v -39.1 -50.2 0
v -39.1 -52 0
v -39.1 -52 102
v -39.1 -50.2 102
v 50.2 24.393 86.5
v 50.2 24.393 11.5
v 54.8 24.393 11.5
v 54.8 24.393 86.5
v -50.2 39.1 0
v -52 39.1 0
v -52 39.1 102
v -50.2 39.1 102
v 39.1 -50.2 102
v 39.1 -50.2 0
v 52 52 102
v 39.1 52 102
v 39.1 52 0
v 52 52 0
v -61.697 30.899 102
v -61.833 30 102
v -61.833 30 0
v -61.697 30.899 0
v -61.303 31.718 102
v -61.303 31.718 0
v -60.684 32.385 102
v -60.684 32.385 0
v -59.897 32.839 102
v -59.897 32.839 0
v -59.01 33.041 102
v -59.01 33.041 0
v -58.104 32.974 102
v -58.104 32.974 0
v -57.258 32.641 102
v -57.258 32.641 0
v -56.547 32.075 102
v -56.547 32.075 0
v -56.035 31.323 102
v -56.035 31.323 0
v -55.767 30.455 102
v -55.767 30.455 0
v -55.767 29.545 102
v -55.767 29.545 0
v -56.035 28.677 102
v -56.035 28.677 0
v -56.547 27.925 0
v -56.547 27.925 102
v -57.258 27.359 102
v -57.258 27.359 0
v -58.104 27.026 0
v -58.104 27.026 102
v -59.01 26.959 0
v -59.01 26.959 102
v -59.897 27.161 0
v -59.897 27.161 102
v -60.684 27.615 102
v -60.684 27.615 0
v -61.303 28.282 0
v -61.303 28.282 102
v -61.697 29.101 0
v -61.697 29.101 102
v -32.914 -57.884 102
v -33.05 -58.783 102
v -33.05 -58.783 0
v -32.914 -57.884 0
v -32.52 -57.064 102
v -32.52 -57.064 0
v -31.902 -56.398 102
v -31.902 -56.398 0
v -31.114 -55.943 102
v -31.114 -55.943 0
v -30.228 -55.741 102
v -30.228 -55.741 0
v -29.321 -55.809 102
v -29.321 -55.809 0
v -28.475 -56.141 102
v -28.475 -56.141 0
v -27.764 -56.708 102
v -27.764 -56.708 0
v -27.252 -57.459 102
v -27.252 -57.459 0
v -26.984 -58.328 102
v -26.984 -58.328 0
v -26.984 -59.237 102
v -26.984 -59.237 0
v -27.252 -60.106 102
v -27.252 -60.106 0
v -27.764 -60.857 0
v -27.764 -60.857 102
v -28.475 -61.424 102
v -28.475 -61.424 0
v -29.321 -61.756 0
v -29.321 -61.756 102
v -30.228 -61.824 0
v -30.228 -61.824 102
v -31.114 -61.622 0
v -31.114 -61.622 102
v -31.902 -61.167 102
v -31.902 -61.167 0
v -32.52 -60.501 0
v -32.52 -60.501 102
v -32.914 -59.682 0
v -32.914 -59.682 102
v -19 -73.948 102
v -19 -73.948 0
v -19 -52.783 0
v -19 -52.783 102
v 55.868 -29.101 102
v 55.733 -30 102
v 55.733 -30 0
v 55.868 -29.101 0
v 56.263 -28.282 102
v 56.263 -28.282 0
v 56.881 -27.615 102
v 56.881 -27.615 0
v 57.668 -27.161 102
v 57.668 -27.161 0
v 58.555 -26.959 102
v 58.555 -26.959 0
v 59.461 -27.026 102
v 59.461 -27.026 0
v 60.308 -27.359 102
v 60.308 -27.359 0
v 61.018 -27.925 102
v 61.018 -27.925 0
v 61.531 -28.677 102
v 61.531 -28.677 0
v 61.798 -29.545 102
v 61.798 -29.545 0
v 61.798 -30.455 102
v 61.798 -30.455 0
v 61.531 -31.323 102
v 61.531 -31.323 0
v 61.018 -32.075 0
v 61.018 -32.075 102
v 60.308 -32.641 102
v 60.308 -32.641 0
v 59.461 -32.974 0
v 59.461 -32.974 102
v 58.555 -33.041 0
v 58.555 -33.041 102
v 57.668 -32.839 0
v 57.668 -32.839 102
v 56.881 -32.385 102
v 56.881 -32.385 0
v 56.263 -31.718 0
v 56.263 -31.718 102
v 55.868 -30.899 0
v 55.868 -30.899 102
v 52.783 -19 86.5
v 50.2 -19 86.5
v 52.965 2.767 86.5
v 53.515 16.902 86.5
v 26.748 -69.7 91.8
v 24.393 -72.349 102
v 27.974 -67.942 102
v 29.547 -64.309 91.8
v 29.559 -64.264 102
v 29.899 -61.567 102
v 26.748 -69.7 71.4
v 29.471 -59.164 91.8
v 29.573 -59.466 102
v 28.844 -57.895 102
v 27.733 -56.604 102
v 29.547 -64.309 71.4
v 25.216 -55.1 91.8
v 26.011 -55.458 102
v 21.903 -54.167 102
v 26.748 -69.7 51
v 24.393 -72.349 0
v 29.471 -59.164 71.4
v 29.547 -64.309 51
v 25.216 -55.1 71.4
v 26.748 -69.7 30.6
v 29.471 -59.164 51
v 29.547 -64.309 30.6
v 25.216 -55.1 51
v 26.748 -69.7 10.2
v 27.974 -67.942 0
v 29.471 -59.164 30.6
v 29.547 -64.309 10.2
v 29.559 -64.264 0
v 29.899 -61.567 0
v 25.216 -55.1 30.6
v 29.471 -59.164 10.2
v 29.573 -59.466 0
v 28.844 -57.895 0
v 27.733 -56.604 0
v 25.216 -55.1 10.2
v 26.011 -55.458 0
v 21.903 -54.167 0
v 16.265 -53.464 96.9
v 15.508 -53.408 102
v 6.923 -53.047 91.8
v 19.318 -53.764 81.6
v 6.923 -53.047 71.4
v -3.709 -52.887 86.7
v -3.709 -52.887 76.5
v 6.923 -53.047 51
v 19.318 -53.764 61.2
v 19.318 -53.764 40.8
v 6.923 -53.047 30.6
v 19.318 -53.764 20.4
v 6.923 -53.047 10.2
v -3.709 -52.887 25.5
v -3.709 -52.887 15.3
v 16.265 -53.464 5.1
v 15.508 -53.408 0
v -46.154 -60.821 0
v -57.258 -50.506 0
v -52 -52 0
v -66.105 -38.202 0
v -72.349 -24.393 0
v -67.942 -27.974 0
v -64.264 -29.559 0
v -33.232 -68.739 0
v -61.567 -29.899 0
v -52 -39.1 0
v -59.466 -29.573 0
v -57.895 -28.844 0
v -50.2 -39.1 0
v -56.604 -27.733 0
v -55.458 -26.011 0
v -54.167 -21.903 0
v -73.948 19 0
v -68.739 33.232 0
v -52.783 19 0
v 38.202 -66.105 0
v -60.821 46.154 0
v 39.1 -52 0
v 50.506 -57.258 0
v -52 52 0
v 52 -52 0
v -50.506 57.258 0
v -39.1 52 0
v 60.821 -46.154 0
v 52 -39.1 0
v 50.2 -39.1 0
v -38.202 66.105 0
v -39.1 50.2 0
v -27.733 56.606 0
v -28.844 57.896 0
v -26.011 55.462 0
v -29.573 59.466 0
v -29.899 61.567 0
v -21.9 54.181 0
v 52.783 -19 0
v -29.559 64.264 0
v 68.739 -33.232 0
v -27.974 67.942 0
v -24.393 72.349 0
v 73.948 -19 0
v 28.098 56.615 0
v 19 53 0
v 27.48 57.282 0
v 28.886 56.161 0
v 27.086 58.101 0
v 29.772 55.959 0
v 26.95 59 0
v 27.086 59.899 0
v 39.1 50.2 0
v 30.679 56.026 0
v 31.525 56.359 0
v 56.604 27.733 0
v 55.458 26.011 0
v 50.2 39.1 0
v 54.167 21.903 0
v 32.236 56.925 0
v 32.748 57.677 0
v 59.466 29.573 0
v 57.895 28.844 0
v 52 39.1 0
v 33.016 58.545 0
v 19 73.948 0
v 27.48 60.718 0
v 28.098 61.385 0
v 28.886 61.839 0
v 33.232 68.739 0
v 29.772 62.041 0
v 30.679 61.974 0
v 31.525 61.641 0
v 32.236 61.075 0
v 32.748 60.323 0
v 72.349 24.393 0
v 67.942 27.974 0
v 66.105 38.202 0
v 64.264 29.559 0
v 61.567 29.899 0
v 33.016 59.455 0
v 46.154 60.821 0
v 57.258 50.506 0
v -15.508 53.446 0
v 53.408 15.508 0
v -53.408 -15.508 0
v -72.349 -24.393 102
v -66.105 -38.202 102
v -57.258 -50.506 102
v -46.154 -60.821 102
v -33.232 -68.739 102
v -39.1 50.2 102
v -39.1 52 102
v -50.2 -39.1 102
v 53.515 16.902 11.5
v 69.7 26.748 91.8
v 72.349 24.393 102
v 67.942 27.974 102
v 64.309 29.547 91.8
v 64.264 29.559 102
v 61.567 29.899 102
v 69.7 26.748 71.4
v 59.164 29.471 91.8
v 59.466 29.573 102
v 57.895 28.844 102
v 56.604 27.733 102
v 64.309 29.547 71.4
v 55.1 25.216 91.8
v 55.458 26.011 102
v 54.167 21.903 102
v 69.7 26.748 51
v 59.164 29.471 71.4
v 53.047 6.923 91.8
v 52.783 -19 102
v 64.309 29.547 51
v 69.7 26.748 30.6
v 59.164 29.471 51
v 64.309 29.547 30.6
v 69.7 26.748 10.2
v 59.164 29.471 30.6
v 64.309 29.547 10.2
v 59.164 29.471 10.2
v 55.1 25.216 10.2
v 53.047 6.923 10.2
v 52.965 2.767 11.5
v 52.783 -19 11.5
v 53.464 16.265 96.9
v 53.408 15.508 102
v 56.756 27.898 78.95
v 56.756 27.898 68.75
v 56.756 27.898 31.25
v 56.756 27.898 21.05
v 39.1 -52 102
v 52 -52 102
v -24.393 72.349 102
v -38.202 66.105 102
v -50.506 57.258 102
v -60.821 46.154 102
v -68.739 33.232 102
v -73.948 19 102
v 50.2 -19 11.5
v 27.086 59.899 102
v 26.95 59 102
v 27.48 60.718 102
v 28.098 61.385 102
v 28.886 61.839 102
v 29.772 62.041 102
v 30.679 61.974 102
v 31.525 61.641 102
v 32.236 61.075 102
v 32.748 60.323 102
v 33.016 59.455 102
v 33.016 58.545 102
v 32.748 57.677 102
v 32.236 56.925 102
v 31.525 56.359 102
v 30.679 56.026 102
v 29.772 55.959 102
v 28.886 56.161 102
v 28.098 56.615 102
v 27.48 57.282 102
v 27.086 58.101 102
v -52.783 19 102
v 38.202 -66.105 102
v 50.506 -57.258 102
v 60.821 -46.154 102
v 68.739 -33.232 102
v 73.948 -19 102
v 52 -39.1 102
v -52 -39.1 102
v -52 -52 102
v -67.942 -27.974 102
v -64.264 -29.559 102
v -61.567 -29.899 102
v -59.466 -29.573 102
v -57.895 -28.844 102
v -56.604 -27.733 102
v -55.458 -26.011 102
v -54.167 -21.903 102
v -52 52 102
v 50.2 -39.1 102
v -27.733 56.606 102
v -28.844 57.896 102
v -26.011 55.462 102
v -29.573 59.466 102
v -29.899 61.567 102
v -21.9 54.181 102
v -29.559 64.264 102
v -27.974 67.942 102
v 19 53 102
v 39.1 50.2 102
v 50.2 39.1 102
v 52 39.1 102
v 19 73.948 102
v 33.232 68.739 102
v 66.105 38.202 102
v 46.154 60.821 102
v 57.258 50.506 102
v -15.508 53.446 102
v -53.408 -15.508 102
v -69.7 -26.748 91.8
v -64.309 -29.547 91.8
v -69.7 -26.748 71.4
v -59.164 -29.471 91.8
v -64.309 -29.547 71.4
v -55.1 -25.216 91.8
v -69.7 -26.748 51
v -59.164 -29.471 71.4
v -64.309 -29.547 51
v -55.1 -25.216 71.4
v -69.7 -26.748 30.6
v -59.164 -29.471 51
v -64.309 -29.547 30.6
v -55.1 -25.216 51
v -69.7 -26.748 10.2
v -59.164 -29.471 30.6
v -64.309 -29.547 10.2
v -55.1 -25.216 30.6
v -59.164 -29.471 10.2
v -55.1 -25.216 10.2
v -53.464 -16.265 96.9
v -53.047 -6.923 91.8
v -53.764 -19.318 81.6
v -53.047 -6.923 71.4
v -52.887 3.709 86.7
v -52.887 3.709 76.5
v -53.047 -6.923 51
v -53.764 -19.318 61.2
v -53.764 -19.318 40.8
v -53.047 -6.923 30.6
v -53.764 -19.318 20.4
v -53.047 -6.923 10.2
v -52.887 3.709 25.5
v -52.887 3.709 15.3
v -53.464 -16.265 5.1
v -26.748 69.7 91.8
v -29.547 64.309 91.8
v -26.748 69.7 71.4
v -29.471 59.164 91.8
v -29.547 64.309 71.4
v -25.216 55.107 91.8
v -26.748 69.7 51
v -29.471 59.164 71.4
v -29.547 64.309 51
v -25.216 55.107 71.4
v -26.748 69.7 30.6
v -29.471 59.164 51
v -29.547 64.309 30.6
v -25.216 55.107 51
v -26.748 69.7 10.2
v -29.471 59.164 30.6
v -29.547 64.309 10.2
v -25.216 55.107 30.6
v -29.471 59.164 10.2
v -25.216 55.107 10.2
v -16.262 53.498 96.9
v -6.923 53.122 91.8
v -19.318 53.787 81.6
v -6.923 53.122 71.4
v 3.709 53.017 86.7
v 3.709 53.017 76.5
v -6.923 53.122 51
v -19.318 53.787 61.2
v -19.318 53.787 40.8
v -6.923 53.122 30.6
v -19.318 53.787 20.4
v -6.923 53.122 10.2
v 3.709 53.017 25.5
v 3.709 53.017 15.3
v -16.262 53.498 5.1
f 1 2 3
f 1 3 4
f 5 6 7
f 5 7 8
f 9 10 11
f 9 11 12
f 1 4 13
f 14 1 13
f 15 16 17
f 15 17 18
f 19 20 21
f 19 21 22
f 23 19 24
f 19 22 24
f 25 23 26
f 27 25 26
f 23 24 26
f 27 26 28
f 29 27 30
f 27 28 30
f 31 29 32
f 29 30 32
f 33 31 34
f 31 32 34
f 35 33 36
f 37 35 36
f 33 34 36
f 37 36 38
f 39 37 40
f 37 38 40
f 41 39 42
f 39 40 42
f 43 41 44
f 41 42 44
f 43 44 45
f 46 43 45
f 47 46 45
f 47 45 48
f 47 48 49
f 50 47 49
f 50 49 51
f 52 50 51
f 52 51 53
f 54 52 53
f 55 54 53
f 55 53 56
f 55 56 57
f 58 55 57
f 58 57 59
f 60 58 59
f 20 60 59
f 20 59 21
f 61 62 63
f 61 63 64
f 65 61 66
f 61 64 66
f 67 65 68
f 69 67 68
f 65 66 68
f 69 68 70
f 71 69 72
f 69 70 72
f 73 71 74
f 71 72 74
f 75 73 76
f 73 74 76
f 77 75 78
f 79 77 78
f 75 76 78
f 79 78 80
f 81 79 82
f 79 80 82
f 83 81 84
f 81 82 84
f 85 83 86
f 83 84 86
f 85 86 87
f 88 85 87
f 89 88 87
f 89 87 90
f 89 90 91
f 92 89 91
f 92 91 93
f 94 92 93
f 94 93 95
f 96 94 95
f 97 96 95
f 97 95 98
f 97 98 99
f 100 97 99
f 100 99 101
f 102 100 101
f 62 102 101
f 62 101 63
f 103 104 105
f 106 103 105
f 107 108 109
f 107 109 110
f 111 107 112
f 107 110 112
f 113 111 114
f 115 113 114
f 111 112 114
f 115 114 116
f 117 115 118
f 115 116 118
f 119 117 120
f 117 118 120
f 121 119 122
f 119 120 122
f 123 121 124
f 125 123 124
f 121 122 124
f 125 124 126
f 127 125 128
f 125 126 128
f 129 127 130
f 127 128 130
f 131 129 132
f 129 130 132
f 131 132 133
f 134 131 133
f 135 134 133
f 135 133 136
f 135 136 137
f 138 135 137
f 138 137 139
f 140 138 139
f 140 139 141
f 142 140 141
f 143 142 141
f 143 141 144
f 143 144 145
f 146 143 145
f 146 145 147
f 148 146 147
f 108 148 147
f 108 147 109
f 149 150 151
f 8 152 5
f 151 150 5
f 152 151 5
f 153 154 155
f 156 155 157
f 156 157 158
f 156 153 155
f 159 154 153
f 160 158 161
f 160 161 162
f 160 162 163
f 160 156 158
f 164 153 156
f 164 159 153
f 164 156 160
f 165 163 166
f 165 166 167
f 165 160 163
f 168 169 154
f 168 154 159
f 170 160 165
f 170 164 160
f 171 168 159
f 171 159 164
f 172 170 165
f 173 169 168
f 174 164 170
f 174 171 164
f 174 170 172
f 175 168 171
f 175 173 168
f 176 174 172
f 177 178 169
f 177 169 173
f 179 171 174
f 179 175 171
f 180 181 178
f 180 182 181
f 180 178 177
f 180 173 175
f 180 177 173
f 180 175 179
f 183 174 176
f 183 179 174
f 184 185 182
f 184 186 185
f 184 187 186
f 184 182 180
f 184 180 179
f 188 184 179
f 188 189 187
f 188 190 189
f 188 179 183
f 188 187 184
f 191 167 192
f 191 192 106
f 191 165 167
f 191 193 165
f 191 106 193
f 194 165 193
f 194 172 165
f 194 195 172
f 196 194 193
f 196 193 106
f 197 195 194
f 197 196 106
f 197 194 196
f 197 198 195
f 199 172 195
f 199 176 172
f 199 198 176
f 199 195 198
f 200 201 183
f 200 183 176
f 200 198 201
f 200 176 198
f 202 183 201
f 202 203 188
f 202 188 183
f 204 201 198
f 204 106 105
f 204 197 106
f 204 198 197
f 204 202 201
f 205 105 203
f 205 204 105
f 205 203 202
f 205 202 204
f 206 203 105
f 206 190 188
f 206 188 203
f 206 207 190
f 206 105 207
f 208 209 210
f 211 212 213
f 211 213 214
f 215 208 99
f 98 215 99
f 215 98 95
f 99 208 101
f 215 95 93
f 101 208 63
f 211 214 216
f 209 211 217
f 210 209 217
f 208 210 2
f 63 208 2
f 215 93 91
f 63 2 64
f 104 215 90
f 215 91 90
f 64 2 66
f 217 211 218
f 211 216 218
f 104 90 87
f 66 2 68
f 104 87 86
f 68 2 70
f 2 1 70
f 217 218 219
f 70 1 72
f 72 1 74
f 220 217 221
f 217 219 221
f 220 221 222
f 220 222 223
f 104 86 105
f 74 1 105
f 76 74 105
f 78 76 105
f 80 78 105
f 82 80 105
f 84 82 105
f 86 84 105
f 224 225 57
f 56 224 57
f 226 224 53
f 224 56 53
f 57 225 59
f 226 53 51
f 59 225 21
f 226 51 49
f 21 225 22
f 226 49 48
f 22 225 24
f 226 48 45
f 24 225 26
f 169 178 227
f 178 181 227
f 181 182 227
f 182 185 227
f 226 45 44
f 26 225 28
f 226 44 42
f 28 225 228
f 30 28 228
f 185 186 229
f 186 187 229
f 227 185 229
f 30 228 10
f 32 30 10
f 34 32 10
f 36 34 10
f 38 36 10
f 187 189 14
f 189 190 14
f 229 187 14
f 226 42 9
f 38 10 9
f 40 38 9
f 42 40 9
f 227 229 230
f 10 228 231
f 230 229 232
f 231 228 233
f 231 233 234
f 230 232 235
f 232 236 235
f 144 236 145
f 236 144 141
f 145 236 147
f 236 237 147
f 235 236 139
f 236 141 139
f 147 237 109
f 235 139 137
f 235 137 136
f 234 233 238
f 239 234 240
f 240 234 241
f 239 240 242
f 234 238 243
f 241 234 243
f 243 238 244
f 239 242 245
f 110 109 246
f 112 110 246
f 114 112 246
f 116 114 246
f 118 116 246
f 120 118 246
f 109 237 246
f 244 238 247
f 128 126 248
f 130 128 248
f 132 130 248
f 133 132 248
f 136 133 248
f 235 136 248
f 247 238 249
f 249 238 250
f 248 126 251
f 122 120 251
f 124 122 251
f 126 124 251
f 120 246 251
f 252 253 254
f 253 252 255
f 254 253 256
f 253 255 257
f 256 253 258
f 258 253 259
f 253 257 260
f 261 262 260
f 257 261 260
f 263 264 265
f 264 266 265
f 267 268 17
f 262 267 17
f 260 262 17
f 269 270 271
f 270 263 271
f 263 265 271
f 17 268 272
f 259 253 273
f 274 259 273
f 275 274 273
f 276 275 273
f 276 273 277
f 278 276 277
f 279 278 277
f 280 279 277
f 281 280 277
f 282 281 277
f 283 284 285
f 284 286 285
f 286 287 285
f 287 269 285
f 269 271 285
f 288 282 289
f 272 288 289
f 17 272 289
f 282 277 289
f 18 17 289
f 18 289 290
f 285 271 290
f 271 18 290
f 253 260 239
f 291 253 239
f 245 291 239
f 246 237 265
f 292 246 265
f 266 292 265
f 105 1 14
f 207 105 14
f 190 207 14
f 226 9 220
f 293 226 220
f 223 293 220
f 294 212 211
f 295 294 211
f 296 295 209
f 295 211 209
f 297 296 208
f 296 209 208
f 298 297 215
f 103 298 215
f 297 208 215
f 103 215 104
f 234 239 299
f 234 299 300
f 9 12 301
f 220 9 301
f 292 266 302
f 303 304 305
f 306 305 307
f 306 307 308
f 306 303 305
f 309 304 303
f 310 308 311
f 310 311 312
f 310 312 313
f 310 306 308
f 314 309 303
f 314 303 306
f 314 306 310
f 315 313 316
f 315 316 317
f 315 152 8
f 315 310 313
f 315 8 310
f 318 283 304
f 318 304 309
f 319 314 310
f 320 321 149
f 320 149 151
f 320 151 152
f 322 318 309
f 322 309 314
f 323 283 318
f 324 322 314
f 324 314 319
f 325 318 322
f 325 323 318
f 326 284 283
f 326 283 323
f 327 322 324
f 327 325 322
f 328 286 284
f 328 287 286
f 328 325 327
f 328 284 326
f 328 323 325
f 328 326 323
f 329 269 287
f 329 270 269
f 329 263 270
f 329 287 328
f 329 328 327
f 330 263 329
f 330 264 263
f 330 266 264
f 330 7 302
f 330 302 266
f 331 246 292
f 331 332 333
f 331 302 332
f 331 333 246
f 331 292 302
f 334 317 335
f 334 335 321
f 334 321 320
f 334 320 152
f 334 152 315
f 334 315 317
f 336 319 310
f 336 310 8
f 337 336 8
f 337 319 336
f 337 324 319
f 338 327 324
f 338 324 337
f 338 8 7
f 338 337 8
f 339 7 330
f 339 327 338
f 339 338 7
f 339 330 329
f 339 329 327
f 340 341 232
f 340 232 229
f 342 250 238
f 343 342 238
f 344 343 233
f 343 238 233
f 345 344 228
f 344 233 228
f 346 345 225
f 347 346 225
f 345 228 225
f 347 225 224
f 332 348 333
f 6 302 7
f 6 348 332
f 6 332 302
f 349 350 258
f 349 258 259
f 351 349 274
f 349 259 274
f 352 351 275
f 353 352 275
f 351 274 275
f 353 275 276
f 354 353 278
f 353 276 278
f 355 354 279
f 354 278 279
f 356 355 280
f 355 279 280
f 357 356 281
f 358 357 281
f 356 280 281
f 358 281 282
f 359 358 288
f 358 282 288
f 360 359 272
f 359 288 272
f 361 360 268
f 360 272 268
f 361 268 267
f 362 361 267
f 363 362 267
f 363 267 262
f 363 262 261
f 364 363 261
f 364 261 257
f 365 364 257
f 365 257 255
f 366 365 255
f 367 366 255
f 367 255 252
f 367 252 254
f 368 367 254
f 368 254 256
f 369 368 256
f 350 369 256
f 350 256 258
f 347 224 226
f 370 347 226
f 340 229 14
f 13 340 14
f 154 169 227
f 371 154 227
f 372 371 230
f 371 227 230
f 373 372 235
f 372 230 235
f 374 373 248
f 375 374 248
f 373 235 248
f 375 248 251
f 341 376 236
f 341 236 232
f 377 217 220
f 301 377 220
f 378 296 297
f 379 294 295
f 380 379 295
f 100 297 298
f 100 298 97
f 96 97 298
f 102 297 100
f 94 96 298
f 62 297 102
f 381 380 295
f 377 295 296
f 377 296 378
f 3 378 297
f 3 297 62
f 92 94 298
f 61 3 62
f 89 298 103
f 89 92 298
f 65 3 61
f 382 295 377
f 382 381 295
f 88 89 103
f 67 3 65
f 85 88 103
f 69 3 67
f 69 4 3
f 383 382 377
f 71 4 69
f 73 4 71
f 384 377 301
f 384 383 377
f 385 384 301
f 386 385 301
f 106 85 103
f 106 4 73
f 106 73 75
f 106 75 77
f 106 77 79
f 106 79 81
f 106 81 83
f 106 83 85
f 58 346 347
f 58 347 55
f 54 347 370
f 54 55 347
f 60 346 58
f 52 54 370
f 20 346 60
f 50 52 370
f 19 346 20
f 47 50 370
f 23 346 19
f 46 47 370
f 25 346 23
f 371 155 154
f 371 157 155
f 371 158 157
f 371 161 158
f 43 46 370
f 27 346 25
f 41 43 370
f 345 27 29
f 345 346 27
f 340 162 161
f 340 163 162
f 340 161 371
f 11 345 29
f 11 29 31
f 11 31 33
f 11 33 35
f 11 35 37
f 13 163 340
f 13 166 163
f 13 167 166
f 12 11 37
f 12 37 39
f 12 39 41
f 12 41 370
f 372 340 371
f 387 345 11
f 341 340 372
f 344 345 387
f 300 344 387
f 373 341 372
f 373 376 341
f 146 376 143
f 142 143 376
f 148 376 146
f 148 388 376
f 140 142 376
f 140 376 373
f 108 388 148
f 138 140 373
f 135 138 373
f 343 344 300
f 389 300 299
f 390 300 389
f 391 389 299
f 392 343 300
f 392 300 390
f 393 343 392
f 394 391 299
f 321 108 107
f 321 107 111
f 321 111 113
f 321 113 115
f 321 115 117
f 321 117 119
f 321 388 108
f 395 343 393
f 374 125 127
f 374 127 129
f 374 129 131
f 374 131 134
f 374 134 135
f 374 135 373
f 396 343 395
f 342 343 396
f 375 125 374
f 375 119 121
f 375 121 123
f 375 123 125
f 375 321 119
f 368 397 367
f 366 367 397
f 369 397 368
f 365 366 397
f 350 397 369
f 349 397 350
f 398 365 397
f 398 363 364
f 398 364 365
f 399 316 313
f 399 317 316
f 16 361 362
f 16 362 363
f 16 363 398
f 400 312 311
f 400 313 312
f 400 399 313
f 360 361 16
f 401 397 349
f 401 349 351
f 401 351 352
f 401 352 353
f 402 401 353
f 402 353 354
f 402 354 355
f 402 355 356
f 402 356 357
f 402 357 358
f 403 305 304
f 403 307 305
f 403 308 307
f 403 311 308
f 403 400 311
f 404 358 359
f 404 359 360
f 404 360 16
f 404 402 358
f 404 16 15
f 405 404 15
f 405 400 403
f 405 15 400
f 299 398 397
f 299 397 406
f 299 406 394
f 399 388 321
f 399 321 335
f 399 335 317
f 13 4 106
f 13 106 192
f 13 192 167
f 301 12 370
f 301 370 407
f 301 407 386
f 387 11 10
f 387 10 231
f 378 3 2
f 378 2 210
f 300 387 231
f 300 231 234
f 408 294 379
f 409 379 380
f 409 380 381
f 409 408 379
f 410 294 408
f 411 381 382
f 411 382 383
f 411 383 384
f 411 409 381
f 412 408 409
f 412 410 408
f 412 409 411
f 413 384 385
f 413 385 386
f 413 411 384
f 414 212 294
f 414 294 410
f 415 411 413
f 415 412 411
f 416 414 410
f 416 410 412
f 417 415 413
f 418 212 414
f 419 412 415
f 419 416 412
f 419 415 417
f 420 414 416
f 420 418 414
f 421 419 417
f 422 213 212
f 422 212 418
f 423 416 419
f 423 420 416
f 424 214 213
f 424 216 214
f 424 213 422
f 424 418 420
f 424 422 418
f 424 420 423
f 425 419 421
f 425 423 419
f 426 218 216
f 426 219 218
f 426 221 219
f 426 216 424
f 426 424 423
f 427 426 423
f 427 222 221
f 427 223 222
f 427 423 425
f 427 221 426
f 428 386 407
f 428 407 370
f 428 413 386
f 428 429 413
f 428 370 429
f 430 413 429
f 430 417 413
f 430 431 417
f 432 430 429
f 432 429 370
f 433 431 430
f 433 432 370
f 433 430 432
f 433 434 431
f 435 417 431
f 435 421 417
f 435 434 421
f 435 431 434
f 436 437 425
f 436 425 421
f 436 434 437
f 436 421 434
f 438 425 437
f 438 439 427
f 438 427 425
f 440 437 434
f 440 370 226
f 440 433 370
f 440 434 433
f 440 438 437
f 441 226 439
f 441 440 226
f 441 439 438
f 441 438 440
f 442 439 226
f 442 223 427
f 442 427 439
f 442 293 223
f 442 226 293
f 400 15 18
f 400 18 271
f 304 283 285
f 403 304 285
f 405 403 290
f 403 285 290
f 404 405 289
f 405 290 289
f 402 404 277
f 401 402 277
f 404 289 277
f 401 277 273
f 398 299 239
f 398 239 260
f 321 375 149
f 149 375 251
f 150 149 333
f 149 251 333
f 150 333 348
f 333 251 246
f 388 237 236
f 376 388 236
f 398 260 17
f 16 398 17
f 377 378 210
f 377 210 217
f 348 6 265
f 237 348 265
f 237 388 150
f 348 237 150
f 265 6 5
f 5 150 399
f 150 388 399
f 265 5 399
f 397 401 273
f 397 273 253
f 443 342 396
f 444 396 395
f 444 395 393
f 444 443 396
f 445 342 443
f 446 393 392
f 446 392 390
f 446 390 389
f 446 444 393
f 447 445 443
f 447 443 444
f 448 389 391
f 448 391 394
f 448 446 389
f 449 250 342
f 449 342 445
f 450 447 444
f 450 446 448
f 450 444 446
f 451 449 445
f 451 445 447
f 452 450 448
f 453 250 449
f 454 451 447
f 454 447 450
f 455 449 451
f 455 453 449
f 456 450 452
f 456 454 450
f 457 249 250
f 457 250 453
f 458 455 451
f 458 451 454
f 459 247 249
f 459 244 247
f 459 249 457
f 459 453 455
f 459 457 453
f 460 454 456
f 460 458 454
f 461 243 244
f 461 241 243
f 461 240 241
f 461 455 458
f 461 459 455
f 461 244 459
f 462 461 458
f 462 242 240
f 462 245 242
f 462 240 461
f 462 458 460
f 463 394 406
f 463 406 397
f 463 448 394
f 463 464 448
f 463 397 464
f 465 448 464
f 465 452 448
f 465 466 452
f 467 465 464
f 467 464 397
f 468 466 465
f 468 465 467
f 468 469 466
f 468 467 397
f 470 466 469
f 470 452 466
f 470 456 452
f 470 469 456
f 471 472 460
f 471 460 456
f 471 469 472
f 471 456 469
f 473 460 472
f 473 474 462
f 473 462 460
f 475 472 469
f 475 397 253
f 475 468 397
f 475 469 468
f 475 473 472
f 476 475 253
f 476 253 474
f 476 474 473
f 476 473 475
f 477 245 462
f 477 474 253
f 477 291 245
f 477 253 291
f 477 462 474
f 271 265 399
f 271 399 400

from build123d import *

# Parameters (mm, degrees)
BOSS_EXTRUDE3_OUTLINE_R = 3
BOSS_EXTRUDE3_DEPTH     = 102
CUT_EXTRUDE1_DEPTH      = 102
CUT_EXTRUDE2_DEPTH      = 102
SKETCH4_W               = 0.4
SKETCH4_H               = 1.8
SKETCH4_W_2             = 1.8
SKETCH4_H_2             = 0.4
BOSS_EXTRUDE4_DEPTH     = 102
SKETCH5_W               = 75
SKETCH5_H               = 43.392810524
CUT_EXTRUDE6_DEPTH      = 10
SKETCH7_R               = 3.05
CUT_EXTRUDE9_DEPTH      = 147.084376475


# Read off the part's stored shape, not the designer's step: Boss-Extrude3
with BuildPart() as part:
    # Boss-Extrude3 outline → Boss-Extrude3 (new body)
    with BuildSketch(Plane.XY):
        with BuildLine():
            add(Edge.make_bspline(
                [(24.392810524, -72.348554199), (27.040667073, -69.541086329), (29.089162938, -67.428574969), (30.241441862, -64.355831171), (31.073643307, -60.963009895), (30.561519341, -59.042545022), (29.217193929, -56.673971678), (27.488775543, -54.241382838), (25.105954954, -53), (17.37432721, -53), (-19, -52.782560411)],
                knots=[0, 0, 0, 0, 0, 0, 0, 0, 0, 0, 0, 1, 1, 1, 1, 1, 1, 1, 1, 1, 1, 1], degree=10))
            ThreePointArc((24.392810524, -72.348554199), (55.939709188, -51.962211615), (73.948106805, -19))
            Line((73.948106805, -19), (52.782560411, -19))
            add(Edge.make_bspline(
                [(72.348554199, 24.392810524), (69.541086329, 27.040667073), (67.428574969, 29.089162938), (64.355831171, 30.241441862), (60.963009895, 31.073643307), (59.042545022, 30.561519341), (56.673971678, 29.217193929), (54.241382838, 27.488775543), (53, 25.105954954), (53, 17.37432721), (52.782560411, -19)],
                knots=[0, 0, 0, 0, 0, 0, 0, 0, 0, 0, 0, 1, 1, 1, 1, 1, 1, 1, 1, 1, 1, 1], degree=10))
            ThreePointArc((72.348554199, 24.392810524), (51.962211615, 55.939709188), (19, 73.948106805))
            Line((19, 73.948106805), (19, 53))
            add(Edge.make_bspline(
                [(-24.392810524, 72.348554199), (-27.040667073, 69.541086329), (-29.089162938, 67.428574969), (-30.241441862, 64.355831171), (-31.073643307, 60.963009895), (-30.561519341, 59.042545022), (-29.217193929, 56.673971678), (-27.488775543, 54.241382838), (-25.105954954, 53), (-17.37432721, 53), (19, 53)],
                knots=[0, 0, 0, 0, 0, 0, 0, 0, 0, 0, 0, 1, 1, 1, 1, 1, 1, 1, 1, 1, 1, 1], degree=10))
            ThreePointArc((-24.392810524, 72.348554199), (-55.939709188, 51.962211615), (-73.948106805, 19))
            Line((-73.948106805, 19), (-52.782560411, 19))
            add(Edge.make_bspline(
                [(-72.348554199, -24.392810524), (-69.541086329, -27.040667073), (-67.428574969, -29.089162938), (-64.355831171, -30.241441862), (-60.963009895, -31.073643307), (-59.042545022, -30.561519341), (-56.673971678, -29.217193929), (-54.241382838, -27.488775543), (-53, -25.105954954), (-53, -17.37432721), (-52.782560411, 19)],
                knots=[0, 0, 0, 0, 0, 0, 0, 0, 0, 0, 0, 1, 1, 1, 1, 1, 1, 1, 1, 1, 1, 1], degree=10))
            ThreePointArc((-72.348554199, -24.392810524), (-51.962211615, -55.939709188), (-19, -73.948106805))
            Line((-19, -73.948106805), (-19, -52.782560411))
        make_face()
        with Locations((-30, -58.782560411)):
            Circle(BOSS_EXTRUDE3_OUTLINE_R, mode=Mode.SUBTRACT)
        with Locations((58.782560411, -30)):
            Circle(BOSS_EXTRUDE3_OUTLINE_R, mode=Mode.SUBTRACT)
        with Locations((-58.782560411, 30)):
            Circle(BOSS_EXTRUDE3_OUTLINE_R, mode=Mode.SUBTRACT)
        Polygon((-38.9, -51.6), (-51.6, -51.6), (-51.6, -38.9), (-50, -38.9), (-50, 38.9), (-51.6, 38.9), (-51.6, 51.6), (-38.9, 51.6), (-38.9, 50), (38.9, 50), (38.9, 51.6), (51.6, 51.6), (51.6, 38.9), (50, 38.9), (50, -38.9), (51.6, -38.9), (51.6, -51.6), (38.9, -51.6), (38.9, -50), (-38.9, -50), align=None, mode=Mode.SUBTRACT)
        with Locations((30, 59)):
            Circle(BOSS_EXTRUDE3_OUTLINE_R, mode=Mode.SUBTRACT)
    extrude(amount=BOSS_EXTRUDE3_DEPTH)

    # Sketch2 → Cut-Extrude1 (cut)
    with BuildSketch(Plane.XY.offset(102)):
        Polygon((51.8, -38.7), (50.2, -38.7), (50.2, 38.7), (51.8, 38.7), (51.8, 51.8), (38.7, 51.8), (38.7, 50.2), (-38.7, 50.2), (-38.7, 51.8), (-51.8, 51.8), (-51.8, 38.7), (-50.2, 38.7), (-50.2, -38.7), (-51.8, -38.7), (-51.8, -51.8), (-38.7, -51.8), (-38.7, -50.2), (38.7, -50.2), (38.7, -51.8), (51.8, -51.8), align=None)
        Polygon((51.6, -38.9), (50, -38.9), (50, 38.9), (51.6, 38.9), (51.6, 51.6), (38.9, 51.6), (38.9, 50), (-38.9, 50), (-38.9, 51.6), (-51.6, 51.6), (-51.6, 38.9), (-50, 38.9), (-50, -38.9), (-51.6, -38.9), (-51.6, -51.6), (-38.9, -51.6), (-38.9, -50), (38.9, -50), (38.9, -51.6), (51.6, -51.6), align=None, mode=Mode.SUBTRACT)
    extrude(amount=-CUT_EXTRUDE1_DEPTH, mode=Mode.SUBTRACT)

    # Sketch3 → Cut-Extrude2 (cut)
    with BuildSketch(Plane.XY.offset(102)):
        Polygon((-51.8, -51.8), (-38.7, -51.8), (-38.7, -52), (-52, -52), (-52, -38.7), (-51.8, -38.7), align=None)
        Polygon((38.7, -51.8), (51.8, -51.8), (51.8, -38.7), (52, -38.7), (52, -52), (38.7, -52), align=None)
        Polygon((51.8, 38.7), (51.8, 51.8), (38.7, 51.8), (38.7, 52), (52, 52), (52, 38.7), align=None)
        Polygon((-51.8, 51.8), (-51.8, 38.7), (-52, 38.7), (-52, 52), (-38.7, 52), (-38.7, 51.8), align=None)
    extrude(amount=-CUT_EXTRUDE2_DEPTH, mode=Mode.SUBTRACT)

    # Sketch4 → Boss-Extrude4 (add)
    with BuildSketch(Plane.XY.offset(102)):
        with Locations((-38.9, 51.1)):
            Rectangle(SKETCH4_W, SKETCH4_H)
        with Locations((-51.1, 38.9)):
            Rectangle(SKETCH4_W_2, SKETCH4_H_2)
        with Locations((38.9, 51.1)):
            Rectangle(SKETCH4_W, SKETCH4_H)
        with Locations((51.1, 38.9)):
            Rectangle(SKETCH4_W_2, SKETCH4_H_2)
        with Locations((38.9, -51.1)):
            Rectangle(SKETCH4_W, SKETCH4_H)
        with Locations((51.1, -38.9)):
            Rectangle(SKETCH4_W_2, SKETCH4_H_2)
        with Locations((-51.1, -38.9)):
            Rectangle(SKETCH4_W_2, SKETCH4_H_2)
        with Locations((-38.9, -51.1)):
            Rectangle(SKETCH4_W, SKETCH4_H)
    extrude(amount=-BOSS_EXTRUDE4_DEPTH)

    # Sketch5 → Cut-Extrude6 (cut)
    with BuildSketch(Plane.ZY.offset(-50.2)):
        with Locations((49, 2.696405262)):
            Rectangle(SKETCH5_W, SKETCH5_H)
    extrude(amount=-CUT_EXTRUDE6_DEPTH, mode=Mode.SUBTRACT)

    # Sketch7 → Cut-Extrude9 (cut, through all)
    with BuildSketch(Plane(origin=(0, 0, 0), x_dir=(-1, 0, 0), z_dir=(0, 0, -1))):
        with Locations((30, -58.782560411)):
            Circle(SKETCH7_R)
        with Locations((-58.782560411, -30)):
            Circle(SKETCH7_R)
        with Locations((58.782560411, 30)):
            Circle(SKETCH7_R)
        with Locations((-30, 59)):
            Circle(SKETCH7_R)
    extrude(amount=-CUT_EXTRUDE9_DEPTH, mode=Mode.SUBTRACT)


solid = part.part
